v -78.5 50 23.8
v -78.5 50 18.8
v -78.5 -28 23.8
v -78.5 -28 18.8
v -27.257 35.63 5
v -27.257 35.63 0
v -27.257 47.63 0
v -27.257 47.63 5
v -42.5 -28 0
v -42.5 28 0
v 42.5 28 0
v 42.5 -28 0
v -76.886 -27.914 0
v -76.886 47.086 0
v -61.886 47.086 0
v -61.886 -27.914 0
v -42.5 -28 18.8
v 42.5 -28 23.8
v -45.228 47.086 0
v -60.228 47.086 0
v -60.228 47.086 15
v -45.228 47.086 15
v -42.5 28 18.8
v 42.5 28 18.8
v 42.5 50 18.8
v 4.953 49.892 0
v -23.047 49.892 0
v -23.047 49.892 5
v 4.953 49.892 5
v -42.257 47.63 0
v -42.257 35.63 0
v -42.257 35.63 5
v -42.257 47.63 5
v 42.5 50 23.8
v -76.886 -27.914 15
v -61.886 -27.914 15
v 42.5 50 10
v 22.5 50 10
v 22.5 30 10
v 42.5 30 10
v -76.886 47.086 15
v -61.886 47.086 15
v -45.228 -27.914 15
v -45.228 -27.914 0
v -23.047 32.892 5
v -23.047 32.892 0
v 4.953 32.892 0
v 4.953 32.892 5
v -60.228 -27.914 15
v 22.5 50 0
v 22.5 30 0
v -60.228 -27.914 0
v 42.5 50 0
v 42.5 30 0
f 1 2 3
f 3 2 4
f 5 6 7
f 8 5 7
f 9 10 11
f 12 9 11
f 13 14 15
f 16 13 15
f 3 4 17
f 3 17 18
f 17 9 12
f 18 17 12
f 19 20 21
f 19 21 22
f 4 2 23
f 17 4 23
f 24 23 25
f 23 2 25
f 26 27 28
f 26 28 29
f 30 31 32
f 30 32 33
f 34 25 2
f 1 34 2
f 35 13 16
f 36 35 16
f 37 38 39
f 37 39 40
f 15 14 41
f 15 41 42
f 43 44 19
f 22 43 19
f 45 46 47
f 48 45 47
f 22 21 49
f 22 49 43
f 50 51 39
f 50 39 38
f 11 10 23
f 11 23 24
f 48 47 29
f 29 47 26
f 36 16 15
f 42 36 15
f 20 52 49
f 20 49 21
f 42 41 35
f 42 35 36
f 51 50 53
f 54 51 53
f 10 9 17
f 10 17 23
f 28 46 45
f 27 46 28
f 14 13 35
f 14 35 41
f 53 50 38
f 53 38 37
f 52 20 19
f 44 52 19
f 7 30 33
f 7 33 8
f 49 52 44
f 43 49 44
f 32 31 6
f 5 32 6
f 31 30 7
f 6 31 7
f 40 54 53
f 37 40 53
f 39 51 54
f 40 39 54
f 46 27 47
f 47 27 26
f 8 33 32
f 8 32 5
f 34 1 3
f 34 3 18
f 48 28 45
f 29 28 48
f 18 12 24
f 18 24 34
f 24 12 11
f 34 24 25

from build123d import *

# Parameters (mm, degrees)
F0_W      = 85
F0_H      = 56
F1_DEPTH  = 18.8
F2_W      = 85
F2_H      = 56
F3_DEPTH  = 5
F4_W      = 15
F4_H      = 75
F5_DEPTH  = 15
F7_W      = 28
F7_H      = 17
F8_DEPTH  = 5
F9_W      = 15
F9_H      = 12
F10_DEPTH = 5
F11_W     = 20
F11_H     = 20
F12_DEPTH = 10


with BuildPart() as f1:
    # F0 (on Top) → F1 (new body)
    with BuildSketch(Plane.XY):
        Rectangle(F0_W, F0_H)
    extrude(amount=F1_DEPTH)

    # F2 (on face) → F3 (join)
    with BuildSketch(Plane.XY.offset(18.8)):
        Rectangle(F2_W, F2_H)
        Polygon((42.5, 50), (-78.5, 50), (-78.5, -28), (-42.5, -28), (-42.5, 28), (42.5, 28), align=None)
    extrude(amount=F3_DEPTH)


with BuildPart() as f5:
    # F4 (on Top) → F5 (new body)
    with BuildSketch(Plane.XY):
        with Locations((-69.386211, 9.586167)):
            Rectangle(F4_W, F4_H)
        with Locations((-52.727706, 9.586167)):
            Rectangle(F4_W, F4_H)
    extrude(amount=F5_DEPTH)


with BuildPart() as f8:
    # F7 (on Top) → F8 (new body)
    with BuildSketch(Plane.XY):
        with Locations((-9.047463, 41.392187)):
            Rectangle(F7_W, F7_H)
    extrude(amount=F8_DEPTH)


with BuildPart() as f10:
    # F9 (on Top) → F10 (new body)
    with BuildSketch(Plane.XY):
        with Locations((-34.757165, 41.630149)):
            Rectangle(F9_W, F9_H)
    extrude(amount=F10_DEPTH)


with BuildPart() as f12:
    # F11 (on Top) → F12 (new body)
    with BuildSketch(Plane.XY):
        with Locations((32.5, 40)):
            Rectangle(F11_W, F11_H)
    extrude(amount=F12_DEPTH)


solid = Compound([f1.part, f5.part, f8.part, f10.part, f12.part])
